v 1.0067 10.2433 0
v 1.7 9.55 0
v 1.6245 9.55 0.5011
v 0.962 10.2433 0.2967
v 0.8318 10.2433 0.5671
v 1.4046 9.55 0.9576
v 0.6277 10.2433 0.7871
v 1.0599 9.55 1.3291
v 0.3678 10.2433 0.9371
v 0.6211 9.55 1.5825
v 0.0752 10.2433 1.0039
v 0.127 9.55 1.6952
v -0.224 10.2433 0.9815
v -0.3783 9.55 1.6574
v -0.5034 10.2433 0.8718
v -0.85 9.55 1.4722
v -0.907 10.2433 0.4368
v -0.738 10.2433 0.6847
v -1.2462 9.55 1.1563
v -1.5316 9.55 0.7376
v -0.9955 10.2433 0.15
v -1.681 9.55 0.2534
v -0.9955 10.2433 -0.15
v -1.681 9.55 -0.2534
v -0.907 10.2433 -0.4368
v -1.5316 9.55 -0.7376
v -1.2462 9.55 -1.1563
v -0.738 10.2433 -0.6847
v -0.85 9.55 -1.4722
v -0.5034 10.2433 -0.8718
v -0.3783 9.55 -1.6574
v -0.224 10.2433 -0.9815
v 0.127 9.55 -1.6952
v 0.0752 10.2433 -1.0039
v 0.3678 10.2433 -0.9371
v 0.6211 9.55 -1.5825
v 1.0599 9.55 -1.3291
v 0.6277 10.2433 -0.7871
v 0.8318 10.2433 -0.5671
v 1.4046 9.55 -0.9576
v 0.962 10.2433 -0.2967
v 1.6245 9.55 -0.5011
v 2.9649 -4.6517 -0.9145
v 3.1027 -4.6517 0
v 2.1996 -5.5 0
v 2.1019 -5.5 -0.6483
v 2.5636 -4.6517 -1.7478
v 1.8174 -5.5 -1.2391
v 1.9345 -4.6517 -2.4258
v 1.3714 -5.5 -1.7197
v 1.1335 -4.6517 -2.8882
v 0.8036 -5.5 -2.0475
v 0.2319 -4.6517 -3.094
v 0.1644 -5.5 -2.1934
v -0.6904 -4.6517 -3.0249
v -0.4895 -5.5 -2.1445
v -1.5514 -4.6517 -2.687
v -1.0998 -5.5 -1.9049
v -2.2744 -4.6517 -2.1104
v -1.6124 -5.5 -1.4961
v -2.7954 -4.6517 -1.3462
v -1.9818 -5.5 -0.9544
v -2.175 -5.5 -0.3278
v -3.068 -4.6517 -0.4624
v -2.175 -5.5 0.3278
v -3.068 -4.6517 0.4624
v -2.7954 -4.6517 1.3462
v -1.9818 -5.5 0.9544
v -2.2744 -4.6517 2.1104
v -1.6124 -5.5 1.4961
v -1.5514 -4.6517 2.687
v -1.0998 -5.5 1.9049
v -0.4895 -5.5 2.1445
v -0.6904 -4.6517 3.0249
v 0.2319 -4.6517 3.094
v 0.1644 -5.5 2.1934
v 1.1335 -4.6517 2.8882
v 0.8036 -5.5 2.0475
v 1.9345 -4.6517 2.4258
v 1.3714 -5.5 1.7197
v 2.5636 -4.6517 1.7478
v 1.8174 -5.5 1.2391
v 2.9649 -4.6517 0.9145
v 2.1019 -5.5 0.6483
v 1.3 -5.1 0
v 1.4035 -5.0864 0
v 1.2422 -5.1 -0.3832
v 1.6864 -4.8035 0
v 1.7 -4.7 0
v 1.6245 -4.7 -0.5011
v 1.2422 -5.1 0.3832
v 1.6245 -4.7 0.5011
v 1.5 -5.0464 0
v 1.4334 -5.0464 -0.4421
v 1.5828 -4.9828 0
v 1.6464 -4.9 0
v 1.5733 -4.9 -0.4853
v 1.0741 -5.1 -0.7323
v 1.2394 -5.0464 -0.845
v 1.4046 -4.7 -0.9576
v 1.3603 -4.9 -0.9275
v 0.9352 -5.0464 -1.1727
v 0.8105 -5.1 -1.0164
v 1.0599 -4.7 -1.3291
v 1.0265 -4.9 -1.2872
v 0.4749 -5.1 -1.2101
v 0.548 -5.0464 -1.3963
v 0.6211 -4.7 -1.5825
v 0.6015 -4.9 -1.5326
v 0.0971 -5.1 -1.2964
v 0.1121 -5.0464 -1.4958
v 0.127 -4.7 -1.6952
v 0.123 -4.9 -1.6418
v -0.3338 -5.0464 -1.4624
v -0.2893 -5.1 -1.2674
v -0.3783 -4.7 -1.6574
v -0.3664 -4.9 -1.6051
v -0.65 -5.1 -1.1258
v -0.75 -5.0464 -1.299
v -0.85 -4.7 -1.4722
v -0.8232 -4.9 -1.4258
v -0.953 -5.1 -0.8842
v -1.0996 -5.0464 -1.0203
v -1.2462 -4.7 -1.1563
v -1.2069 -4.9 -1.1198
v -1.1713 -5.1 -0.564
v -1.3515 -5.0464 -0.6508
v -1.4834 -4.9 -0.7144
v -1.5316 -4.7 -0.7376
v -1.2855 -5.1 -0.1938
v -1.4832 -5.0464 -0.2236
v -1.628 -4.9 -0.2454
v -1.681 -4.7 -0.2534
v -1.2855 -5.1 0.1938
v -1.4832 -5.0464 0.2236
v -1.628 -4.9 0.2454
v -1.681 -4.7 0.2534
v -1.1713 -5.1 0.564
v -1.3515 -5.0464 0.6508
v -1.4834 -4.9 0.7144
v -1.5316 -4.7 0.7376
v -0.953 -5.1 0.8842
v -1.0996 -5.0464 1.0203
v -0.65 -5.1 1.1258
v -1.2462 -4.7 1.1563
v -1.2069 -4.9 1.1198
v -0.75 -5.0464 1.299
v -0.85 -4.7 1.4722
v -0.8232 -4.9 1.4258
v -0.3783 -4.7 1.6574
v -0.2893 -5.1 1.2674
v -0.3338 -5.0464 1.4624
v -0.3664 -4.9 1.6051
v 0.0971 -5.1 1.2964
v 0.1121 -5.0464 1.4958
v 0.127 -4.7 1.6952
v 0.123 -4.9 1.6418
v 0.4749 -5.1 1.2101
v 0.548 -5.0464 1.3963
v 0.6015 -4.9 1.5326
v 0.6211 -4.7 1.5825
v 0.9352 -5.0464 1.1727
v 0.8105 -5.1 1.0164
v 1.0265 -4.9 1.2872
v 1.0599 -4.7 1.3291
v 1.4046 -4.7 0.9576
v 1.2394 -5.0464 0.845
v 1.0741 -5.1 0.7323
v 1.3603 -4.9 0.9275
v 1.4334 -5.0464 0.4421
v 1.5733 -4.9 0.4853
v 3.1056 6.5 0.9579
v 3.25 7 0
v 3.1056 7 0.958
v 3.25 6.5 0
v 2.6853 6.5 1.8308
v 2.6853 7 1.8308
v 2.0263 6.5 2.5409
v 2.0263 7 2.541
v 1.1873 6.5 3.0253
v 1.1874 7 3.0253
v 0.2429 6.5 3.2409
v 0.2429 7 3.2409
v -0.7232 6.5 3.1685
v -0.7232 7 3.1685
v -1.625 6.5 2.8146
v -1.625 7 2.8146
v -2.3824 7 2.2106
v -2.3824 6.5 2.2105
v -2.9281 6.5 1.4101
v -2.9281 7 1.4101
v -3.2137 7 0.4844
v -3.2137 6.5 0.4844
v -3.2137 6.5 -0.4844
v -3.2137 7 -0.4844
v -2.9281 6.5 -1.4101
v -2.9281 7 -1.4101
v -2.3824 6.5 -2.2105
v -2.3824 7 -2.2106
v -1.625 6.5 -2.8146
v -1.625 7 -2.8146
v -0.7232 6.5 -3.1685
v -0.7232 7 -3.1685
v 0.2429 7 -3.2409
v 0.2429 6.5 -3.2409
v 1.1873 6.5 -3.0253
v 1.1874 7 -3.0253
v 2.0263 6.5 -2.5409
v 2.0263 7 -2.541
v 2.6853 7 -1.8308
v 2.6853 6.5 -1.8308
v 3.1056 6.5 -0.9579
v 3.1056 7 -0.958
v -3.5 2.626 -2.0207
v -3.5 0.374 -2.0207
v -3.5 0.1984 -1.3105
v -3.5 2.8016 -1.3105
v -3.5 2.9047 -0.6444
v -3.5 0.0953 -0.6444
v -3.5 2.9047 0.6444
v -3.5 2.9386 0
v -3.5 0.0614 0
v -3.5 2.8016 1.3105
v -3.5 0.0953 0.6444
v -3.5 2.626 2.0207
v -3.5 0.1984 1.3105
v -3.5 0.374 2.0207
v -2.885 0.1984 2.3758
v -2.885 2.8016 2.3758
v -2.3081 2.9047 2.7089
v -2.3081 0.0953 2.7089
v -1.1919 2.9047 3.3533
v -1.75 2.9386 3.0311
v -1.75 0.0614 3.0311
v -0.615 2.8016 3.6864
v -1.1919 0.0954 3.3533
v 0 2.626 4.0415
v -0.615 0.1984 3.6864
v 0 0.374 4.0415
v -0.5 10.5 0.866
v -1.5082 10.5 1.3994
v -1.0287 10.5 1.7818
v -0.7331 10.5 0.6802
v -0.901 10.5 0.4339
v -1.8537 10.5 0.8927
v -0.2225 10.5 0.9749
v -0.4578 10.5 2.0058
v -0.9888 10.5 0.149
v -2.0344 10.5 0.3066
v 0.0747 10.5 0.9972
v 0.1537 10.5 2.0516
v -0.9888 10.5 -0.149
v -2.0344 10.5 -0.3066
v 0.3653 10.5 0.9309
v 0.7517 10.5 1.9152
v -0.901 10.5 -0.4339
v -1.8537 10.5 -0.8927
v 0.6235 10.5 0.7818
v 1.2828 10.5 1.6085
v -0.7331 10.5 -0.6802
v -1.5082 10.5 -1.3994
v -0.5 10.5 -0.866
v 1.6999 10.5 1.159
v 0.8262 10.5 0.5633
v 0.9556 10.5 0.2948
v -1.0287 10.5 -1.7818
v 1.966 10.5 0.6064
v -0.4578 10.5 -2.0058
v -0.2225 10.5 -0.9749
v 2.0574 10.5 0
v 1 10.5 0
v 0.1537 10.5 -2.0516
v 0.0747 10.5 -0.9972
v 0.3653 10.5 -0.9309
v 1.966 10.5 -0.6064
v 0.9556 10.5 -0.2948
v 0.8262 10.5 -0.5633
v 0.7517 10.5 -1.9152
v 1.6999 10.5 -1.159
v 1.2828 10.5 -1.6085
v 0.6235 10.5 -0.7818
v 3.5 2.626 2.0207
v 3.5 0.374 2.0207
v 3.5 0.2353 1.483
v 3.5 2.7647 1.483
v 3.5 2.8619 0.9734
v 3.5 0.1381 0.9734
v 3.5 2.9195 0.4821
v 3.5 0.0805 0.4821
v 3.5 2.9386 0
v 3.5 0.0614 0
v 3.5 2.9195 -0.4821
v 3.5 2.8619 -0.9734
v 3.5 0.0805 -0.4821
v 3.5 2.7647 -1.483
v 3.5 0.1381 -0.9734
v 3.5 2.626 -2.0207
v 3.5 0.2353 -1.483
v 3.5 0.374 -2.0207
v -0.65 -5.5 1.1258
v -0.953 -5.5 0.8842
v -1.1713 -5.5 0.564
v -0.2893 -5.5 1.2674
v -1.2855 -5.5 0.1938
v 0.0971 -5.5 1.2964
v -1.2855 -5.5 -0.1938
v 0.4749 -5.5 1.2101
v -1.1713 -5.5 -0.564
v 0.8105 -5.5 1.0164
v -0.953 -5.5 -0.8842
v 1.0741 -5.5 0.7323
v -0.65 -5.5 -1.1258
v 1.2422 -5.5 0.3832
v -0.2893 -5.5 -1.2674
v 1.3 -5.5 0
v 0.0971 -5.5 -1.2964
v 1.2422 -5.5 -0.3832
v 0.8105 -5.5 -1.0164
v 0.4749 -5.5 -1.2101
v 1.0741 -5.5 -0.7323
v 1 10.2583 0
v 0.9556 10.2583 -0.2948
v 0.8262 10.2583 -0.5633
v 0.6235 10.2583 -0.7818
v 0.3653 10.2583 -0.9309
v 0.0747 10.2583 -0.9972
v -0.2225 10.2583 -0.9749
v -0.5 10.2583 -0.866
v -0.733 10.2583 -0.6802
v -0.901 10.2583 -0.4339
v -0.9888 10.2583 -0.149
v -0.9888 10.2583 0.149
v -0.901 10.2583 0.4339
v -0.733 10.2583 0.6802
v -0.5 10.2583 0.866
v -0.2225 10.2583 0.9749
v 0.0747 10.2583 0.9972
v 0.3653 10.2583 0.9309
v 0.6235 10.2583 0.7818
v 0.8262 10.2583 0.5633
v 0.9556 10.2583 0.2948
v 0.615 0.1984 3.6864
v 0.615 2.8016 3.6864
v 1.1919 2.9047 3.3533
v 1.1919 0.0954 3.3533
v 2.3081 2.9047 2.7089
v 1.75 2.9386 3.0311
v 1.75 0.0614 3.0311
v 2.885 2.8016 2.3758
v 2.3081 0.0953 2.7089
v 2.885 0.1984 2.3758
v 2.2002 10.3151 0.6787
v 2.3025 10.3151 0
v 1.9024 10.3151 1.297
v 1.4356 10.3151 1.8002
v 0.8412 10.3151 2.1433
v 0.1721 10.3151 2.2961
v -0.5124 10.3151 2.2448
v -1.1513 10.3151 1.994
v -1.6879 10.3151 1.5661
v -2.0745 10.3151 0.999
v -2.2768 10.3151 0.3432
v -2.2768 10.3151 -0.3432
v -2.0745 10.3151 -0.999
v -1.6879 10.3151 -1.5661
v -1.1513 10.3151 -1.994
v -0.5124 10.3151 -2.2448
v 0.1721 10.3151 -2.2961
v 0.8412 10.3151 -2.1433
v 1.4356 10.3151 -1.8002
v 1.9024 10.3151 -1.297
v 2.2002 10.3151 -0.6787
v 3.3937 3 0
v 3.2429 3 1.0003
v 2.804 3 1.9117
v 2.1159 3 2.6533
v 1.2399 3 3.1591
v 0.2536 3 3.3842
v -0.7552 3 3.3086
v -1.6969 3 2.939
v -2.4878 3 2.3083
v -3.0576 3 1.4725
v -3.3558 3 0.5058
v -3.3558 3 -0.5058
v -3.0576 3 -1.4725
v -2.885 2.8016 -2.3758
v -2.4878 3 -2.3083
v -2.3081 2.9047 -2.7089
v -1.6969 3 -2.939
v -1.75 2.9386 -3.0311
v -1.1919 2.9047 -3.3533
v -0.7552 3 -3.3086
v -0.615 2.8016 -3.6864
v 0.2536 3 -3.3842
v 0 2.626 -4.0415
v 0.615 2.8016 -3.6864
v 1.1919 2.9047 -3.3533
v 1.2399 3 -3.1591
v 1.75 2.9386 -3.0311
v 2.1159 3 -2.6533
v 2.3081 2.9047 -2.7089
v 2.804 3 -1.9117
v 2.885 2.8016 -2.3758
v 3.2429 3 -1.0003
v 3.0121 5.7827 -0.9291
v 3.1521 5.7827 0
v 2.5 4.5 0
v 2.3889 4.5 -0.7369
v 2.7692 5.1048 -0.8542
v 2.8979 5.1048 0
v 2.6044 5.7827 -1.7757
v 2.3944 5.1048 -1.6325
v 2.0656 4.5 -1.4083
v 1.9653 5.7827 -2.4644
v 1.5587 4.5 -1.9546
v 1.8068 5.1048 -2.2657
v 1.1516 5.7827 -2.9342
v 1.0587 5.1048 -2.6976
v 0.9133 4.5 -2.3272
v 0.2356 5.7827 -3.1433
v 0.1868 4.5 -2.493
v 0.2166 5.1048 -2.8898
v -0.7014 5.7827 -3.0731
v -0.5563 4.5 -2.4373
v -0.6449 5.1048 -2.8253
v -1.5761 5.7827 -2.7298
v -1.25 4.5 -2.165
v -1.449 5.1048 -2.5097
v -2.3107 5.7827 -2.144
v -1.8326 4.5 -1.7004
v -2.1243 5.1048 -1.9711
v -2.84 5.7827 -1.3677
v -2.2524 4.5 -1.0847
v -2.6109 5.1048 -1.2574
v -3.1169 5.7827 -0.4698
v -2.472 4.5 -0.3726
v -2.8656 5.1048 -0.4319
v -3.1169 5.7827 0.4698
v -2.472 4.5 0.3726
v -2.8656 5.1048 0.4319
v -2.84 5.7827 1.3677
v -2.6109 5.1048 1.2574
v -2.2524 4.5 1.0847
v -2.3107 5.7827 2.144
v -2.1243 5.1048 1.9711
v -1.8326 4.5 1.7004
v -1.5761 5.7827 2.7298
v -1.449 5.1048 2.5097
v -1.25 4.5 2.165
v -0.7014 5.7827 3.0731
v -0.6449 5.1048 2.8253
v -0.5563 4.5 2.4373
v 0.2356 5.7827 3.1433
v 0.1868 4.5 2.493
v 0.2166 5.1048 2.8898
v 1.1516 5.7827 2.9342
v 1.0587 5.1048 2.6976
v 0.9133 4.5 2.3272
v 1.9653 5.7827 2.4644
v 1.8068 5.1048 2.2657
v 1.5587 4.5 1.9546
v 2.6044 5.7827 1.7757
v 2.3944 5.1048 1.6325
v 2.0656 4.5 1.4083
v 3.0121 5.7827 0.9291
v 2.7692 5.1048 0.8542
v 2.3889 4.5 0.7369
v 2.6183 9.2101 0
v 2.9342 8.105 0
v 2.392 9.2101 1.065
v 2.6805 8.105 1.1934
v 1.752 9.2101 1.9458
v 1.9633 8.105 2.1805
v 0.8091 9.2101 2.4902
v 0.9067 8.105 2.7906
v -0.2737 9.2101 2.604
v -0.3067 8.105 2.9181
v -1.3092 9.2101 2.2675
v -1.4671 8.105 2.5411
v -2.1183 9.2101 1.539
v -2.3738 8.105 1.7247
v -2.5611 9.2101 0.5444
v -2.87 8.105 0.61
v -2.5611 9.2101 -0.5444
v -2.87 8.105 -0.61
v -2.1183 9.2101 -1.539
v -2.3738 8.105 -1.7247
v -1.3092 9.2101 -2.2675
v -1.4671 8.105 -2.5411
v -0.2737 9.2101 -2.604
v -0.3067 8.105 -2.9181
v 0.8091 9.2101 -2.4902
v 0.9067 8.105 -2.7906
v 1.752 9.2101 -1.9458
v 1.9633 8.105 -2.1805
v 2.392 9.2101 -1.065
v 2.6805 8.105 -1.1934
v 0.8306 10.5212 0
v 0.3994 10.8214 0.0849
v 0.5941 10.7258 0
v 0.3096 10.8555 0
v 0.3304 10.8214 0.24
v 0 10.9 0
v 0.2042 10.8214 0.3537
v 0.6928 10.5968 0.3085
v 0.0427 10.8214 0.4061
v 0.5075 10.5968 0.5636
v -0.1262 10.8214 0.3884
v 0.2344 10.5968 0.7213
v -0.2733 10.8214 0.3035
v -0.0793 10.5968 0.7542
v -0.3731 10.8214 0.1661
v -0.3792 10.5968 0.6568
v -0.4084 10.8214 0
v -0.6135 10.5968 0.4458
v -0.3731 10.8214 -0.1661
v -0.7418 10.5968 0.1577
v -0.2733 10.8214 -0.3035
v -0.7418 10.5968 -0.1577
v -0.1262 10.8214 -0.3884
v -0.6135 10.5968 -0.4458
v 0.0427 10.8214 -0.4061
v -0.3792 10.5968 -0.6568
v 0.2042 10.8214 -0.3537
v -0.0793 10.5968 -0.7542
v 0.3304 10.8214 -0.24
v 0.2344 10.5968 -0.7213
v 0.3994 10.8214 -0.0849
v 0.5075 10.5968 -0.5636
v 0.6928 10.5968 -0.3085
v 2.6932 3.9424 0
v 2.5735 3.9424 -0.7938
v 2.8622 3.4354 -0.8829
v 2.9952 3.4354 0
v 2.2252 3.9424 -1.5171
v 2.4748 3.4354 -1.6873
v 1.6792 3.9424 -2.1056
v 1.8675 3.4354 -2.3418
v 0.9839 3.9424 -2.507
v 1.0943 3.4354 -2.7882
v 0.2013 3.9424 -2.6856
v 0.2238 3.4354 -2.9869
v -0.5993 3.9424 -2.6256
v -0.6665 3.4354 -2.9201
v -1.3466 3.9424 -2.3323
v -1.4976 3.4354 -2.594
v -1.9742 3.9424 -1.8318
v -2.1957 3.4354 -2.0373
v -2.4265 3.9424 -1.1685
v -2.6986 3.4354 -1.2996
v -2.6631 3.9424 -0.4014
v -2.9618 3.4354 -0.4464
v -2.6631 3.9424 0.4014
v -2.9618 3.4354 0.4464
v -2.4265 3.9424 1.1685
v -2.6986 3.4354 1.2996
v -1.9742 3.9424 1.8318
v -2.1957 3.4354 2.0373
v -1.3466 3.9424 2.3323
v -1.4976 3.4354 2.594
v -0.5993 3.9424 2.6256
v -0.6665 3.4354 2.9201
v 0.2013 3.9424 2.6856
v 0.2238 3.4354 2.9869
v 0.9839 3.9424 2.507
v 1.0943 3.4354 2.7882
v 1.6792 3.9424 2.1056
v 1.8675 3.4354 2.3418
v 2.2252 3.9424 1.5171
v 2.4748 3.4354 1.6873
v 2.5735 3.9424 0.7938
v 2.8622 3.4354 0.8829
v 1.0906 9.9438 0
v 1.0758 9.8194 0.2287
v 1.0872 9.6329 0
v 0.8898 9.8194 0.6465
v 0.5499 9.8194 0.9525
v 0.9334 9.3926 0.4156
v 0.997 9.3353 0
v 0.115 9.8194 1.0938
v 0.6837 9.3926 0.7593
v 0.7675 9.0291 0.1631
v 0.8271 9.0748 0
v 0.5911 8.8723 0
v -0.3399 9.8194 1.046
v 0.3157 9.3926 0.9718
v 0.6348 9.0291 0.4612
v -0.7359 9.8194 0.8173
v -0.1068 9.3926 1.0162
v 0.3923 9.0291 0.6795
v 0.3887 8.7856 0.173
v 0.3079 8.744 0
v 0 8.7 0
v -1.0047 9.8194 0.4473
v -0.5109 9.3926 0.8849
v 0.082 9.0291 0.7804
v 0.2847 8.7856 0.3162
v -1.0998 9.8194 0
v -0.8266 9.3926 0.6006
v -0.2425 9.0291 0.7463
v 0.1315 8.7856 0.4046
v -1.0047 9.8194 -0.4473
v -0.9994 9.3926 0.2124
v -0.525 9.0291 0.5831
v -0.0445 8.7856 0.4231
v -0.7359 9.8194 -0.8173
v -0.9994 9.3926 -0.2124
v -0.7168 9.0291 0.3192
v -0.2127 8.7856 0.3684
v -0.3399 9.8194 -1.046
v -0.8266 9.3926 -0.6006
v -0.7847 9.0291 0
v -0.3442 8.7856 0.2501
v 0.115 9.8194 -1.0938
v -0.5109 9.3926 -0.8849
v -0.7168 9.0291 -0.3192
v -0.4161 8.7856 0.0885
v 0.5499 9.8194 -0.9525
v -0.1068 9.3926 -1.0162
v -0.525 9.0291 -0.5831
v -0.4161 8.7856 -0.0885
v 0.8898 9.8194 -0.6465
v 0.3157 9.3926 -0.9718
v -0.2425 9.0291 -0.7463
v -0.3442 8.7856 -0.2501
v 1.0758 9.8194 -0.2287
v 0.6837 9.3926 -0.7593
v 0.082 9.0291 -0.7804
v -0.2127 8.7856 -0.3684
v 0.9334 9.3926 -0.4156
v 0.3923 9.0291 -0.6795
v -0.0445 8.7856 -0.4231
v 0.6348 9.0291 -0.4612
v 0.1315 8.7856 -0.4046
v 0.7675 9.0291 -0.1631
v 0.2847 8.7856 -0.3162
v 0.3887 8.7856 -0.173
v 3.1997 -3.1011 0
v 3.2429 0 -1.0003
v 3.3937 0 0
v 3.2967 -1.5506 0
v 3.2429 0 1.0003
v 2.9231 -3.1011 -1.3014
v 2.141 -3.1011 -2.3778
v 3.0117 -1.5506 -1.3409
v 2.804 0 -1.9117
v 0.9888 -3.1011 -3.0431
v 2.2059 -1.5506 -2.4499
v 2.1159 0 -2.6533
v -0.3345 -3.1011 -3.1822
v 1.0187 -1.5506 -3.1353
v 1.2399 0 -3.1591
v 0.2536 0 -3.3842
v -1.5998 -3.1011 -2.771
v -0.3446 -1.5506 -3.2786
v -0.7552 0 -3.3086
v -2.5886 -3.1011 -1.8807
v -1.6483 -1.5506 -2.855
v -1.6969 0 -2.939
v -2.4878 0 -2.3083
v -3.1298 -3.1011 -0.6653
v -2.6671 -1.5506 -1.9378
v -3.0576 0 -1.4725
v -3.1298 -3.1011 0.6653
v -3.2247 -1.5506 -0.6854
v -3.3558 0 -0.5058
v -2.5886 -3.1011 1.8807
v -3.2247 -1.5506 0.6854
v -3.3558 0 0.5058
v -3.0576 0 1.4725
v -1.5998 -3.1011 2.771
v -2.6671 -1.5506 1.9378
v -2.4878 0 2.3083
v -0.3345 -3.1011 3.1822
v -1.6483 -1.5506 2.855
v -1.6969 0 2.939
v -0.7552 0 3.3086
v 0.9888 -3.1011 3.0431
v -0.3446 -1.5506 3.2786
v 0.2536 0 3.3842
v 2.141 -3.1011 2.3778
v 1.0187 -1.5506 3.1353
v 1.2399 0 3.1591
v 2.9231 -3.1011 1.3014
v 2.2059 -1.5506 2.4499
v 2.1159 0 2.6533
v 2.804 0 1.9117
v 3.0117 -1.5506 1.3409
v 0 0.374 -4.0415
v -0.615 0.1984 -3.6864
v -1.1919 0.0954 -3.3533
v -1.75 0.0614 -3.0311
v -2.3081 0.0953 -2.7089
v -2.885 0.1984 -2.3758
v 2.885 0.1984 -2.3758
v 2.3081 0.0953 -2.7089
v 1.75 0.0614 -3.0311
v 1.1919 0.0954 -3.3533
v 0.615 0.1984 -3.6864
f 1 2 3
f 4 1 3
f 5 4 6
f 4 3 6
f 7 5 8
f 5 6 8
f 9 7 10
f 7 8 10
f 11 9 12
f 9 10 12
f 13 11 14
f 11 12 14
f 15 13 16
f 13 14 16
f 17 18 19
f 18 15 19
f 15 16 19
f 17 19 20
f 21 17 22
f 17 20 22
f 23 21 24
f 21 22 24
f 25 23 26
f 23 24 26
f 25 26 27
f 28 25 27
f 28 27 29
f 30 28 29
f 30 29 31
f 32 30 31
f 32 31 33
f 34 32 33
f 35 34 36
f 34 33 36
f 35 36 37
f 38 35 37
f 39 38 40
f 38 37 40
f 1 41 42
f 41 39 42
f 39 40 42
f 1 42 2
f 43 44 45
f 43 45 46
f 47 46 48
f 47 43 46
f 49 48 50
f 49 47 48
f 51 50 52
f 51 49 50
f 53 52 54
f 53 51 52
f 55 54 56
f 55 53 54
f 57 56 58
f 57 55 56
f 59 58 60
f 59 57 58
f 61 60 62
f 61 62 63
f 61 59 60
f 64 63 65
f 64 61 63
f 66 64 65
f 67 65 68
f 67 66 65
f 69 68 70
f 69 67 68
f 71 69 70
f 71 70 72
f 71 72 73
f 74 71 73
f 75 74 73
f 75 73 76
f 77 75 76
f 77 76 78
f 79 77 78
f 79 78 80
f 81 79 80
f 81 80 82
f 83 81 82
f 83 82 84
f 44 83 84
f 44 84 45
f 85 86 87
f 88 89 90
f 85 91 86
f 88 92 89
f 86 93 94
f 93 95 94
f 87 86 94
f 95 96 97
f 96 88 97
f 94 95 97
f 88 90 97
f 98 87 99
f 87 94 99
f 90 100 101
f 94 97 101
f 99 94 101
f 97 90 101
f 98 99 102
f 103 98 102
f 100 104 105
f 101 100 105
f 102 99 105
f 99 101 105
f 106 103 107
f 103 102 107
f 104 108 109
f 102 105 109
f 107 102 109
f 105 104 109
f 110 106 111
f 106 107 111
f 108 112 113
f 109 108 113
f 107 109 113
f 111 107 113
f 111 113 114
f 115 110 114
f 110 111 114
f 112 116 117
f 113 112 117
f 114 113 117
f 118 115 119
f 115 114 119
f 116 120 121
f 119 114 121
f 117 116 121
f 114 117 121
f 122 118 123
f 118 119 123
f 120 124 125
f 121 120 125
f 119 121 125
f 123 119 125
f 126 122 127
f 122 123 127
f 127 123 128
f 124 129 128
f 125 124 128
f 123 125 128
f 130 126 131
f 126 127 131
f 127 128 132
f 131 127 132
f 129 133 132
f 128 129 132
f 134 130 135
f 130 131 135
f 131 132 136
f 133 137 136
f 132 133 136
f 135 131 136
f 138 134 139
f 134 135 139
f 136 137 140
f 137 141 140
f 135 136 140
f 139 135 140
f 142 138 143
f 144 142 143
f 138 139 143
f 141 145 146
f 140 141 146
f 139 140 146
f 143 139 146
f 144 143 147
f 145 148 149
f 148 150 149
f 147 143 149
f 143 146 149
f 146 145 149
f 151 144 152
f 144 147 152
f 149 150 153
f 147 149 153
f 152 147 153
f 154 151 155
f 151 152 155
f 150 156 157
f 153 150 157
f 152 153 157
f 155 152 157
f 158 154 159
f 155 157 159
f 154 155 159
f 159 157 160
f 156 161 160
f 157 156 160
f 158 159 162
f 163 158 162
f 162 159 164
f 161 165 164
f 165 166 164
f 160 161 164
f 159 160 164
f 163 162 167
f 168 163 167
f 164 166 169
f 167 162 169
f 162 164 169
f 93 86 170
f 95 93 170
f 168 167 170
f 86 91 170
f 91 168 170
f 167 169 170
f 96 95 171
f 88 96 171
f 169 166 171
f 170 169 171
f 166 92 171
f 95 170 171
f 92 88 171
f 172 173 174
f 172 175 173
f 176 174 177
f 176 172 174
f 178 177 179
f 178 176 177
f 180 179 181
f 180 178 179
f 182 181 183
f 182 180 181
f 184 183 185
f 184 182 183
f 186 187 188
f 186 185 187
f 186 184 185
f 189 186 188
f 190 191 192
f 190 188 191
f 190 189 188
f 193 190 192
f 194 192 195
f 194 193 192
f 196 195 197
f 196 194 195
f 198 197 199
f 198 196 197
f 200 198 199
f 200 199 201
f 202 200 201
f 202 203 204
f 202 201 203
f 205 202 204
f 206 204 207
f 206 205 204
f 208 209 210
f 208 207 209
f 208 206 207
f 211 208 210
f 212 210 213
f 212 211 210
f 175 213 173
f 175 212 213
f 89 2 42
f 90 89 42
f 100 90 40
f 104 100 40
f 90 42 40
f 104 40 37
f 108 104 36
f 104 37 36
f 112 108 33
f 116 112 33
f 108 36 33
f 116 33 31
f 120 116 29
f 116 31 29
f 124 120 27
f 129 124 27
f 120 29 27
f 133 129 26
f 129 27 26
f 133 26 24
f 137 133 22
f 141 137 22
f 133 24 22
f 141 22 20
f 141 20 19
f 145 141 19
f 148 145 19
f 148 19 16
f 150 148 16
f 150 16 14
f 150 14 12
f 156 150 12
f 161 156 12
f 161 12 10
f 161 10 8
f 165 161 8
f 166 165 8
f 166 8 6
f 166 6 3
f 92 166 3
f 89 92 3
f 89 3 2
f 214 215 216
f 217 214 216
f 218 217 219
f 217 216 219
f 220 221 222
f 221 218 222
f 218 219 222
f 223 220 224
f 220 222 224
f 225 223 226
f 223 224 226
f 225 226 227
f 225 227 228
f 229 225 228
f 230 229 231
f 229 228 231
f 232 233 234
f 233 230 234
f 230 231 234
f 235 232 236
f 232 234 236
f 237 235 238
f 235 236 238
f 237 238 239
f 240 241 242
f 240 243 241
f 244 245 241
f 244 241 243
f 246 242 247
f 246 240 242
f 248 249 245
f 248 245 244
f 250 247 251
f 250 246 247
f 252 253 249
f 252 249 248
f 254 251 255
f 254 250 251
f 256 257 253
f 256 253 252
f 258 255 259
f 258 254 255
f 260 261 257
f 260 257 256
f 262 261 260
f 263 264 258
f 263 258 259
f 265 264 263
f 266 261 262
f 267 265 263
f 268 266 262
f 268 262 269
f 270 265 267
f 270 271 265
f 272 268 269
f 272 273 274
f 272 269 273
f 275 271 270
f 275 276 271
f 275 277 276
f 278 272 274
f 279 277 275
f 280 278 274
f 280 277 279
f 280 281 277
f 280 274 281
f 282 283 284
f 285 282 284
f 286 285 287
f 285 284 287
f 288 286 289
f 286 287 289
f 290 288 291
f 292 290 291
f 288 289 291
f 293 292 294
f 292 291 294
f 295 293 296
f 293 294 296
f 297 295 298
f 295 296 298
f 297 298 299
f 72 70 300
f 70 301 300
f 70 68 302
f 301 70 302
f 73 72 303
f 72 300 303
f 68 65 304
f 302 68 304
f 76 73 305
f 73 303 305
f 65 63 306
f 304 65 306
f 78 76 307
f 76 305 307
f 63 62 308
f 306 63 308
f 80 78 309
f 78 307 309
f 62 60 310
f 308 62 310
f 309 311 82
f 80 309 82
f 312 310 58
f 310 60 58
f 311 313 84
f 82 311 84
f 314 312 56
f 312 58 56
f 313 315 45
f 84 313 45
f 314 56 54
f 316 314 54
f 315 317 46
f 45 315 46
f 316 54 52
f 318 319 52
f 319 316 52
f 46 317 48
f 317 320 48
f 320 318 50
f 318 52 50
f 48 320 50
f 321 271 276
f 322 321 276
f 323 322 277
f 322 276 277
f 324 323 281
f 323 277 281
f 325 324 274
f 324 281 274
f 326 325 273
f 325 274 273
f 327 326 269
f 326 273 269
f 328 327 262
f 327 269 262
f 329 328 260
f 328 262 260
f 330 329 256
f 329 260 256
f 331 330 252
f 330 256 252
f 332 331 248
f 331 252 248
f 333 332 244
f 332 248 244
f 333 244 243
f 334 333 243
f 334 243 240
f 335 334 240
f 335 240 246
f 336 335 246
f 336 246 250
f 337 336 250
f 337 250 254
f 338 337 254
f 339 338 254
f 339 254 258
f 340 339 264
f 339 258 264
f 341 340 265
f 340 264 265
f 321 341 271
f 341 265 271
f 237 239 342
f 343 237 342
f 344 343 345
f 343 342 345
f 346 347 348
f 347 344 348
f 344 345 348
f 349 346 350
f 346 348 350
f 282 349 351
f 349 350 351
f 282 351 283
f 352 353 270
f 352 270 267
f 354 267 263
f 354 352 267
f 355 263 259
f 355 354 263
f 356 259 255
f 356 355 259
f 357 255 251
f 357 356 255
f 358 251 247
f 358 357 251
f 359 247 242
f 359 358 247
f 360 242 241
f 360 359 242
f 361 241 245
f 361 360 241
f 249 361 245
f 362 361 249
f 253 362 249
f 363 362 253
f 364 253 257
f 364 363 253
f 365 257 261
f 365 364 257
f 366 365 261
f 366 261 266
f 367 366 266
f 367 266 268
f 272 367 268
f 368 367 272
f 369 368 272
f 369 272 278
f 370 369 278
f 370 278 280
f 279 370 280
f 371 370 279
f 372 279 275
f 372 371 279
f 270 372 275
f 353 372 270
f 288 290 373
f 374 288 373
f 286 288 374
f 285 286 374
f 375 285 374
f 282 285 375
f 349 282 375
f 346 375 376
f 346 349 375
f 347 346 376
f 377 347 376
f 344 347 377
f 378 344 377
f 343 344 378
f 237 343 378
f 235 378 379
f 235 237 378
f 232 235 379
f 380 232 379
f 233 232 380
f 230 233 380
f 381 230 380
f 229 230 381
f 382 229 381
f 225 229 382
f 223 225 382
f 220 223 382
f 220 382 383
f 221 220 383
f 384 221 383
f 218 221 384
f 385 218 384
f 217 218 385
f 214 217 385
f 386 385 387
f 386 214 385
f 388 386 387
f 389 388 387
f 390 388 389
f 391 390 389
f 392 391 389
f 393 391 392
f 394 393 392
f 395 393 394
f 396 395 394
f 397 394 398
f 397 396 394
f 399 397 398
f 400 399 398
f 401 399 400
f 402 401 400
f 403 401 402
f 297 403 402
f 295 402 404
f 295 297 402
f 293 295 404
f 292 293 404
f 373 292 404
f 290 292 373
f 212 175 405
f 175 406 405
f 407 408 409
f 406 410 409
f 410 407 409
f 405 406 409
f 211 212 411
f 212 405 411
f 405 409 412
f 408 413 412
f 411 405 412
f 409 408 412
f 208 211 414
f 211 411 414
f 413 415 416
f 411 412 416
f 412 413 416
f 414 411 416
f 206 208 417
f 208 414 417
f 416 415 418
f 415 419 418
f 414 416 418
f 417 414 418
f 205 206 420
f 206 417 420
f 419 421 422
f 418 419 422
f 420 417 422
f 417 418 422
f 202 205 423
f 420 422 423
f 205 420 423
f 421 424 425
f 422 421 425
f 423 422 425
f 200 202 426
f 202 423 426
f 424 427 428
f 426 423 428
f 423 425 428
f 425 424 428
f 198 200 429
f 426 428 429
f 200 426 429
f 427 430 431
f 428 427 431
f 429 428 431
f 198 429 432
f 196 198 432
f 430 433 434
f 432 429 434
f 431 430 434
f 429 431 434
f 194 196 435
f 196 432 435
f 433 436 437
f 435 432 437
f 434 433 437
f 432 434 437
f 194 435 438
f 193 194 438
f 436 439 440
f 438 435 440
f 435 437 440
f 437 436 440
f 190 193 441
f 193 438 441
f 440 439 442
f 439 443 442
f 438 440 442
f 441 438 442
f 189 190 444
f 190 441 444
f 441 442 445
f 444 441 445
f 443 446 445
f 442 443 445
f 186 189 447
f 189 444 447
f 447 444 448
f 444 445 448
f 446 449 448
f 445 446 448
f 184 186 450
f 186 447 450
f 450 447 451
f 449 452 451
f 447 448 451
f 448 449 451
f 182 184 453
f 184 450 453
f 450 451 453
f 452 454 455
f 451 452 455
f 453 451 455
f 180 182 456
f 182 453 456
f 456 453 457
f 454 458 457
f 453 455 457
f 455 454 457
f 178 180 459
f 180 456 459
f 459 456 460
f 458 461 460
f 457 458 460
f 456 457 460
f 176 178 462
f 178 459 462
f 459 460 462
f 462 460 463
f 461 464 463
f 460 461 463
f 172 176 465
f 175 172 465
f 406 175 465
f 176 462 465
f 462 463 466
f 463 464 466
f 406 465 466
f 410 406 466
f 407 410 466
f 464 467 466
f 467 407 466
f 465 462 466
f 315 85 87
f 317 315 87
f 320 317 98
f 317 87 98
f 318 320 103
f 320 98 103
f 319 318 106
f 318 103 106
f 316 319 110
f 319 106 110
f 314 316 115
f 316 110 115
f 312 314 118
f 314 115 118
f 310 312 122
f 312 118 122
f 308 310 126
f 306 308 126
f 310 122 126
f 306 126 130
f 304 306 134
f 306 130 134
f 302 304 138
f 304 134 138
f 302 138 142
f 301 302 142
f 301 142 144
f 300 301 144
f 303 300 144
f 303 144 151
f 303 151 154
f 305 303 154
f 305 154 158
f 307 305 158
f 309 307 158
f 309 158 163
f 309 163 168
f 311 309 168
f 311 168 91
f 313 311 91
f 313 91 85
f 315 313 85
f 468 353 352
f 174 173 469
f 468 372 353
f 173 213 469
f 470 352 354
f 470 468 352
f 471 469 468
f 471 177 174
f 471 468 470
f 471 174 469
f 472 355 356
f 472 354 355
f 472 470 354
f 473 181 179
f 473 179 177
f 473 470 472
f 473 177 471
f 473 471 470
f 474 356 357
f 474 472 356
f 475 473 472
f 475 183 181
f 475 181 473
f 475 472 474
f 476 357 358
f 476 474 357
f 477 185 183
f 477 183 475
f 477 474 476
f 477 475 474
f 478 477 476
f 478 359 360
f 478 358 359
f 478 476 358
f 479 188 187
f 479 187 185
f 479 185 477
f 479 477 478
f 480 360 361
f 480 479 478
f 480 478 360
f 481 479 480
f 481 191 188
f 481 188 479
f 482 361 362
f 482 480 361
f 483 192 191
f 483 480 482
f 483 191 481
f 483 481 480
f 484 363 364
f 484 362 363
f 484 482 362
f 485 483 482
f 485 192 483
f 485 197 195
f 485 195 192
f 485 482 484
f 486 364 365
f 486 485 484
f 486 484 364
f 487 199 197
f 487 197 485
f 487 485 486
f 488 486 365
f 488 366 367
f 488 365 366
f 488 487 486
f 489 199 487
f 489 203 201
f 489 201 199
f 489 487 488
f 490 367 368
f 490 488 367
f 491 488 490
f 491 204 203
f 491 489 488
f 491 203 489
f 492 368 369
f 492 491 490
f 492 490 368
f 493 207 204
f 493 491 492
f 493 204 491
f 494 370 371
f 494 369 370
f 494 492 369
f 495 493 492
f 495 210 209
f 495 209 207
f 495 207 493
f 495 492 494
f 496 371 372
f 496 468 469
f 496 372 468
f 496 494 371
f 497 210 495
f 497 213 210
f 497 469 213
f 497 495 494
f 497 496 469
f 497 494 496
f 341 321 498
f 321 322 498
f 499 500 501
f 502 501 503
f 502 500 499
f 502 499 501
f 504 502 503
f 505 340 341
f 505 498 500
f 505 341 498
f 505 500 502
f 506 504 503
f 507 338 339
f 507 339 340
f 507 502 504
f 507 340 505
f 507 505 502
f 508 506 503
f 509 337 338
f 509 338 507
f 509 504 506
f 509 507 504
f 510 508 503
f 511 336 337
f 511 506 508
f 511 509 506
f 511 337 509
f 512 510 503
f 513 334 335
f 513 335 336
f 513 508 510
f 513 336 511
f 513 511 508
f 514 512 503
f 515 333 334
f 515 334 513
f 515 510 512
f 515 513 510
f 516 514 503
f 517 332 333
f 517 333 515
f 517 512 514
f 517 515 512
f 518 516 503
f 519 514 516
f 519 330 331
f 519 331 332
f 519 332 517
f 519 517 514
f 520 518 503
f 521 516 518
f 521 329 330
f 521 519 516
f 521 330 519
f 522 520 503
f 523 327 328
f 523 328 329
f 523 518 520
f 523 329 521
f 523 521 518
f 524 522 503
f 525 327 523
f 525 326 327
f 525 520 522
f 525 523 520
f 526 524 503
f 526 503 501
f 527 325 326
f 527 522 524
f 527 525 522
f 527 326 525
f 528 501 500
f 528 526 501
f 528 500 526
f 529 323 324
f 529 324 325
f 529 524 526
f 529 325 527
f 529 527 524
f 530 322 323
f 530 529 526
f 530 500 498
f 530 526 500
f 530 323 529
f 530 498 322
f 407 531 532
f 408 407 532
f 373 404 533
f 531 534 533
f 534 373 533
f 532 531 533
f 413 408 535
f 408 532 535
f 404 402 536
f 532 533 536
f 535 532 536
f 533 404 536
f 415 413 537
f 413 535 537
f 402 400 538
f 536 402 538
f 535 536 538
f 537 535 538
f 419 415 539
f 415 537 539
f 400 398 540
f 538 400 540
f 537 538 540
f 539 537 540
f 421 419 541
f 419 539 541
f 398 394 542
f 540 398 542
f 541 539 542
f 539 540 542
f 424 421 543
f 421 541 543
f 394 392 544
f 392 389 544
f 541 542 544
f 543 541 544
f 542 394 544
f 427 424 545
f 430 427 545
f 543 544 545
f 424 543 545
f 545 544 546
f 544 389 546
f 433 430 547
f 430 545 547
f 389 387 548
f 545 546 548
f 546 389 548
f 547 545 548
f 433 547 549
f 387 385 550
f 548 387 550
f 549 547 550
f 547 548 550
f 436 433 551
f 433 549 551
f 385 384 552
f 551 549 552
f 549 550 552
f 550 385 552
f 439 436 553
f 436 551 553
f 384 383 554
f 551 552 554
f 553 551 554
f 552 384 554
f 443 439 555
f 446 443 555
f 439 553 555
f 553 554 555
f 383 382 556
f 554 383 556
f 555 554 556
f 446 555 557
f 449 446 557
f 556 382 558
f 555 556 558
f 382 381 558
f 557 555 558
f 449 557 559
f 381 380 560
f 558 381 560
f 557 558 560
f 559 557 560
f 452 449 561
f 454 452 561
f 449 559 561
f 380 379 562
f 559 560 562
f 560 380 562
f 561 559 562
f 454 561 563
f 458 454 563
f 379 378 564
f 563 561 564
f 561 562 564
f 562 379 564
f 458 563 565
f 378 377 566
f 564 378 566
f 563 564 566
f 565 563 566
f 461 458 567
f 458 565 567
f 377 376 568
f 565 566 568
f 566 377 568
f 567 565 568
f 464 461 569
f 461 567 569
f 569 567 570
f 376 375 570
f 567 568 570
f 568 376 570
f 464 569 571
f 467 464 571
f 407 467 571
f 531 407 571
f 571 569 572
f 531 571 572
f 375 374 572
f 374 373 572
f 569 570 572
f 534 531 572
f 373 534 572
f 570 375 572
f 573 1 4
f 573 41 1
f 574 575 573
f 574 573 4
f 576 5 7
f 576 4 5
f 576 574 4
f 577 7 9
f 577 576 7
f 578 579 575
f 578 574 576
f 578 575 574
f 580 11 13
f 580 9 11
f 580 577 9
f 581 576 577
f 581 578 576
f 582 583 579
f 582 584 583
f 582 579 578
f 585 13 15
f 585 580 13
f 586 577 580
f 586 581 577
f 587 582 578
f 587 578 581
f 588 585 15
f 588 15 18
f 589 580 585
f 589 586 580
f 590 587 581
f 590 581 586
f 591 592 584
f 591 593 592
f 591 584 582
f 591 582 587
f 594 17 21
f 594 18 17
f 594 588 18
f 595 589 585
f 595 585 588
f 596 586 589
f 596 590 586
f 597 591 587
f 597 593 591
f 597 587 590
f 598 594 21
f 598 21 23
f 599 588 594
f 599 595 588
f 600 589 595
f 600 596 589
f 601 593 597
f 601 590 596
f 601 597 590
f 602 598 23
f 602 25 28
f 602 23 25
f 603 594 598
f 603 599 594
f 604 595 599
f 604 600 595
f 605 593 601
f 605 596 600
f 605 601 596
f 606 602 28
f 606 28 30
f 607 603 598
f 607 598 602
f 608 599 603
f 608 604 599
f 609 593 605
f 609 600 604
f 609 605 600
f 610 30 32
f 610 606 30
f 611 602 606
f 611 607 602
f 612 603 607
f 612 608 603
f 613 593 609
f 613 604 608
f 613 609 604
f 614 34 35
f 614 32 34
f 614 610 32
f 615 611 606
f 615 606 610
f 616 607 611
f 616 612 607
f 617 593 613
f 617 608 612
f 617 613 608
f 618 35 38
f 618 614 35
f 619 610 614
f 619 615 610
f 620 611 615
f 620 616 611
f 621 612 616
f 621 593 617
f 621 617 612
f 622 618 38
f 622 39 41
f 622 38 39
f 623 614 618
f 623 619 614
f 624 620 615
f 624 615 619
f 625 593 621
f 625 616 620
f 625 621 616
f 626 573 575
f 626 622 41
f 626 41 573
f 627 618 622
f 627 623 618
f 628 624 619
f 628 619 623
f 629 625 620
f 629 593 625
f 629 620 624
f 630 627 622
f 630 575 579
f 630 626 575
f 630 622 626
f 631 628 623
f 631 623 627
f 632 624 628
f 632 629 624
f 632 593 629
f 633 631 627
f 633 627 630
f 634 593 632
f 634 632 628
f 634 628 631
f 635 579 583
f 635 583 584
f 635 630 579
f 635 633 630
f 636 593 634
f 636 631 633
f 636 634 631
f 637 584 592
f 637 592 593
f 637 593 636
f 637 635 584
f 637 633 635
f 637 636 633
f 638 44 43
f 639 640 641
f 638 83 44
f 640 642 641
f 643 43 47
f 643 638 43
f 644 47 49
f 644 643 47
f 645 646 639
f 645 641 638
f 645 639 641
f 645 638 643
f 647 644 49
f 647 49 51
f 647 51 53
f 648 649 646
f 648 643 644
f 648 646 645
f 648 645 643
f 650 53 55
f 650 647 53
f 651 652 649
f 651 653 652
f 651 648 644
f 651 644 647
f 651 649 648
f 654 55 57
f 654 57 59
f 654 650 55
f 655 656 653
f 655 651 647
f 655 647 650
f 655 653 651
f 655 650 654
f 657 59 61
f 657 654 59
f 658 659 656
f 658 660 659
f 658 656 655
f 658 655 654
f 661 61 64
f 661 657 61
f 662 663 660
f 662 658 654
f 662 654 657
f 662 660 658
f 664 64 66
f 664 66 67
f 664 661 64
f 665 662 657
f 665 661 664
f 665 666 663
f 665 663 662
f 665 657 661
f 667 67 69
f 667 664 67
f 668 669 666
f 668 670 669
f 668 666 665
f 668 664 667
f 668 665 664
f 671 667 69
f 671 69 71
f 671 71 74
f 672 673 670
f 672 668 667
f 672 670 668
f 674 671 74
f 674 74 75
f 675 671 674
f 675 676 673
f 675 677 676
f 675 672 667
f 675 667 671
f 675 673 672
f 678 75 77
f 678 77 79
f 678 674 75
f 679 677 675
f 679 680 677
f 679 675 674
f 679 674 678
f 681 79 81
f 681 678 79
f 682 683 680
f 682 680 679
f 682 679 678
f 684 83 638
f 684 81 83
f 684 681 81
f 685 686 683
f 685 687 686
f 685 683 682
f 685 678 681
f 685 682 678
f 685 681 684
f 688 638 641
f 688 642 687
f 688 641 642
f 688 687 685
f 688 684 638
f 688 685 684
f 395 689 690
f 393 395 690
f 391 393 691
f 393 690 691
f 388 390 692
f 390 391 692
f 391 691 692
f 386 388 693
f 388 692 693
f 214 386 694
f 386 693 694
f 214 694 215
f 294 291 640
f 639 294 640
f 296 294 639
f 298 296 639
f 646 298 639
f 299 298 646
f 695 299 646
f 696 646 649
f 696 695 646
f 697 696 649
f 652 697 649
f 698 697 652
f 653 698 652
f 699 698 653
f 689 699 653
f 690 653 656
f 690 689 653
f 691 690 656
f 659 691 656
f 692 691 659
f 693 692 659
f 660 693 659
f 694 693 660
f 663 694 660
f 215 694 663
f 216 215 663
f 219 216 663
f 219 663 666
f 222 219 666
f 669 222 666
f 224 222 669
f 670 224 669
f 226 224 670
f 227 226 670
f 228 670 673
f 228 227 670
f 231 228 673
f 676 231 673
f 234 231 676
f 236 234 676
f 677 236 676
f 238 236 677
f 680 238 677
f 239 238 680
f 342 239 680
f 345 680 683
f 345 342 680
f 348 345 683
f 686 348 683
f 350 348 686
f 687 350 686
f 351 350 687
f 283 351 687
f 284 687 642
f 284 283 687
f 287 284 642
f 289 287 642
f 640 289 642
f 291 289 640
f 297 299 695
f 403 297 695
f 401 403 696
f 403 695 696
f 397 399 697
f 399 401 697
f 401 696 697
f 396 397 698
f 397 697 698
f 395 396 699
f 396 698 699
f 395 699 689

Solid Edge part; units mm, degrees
sketch "Sketch1" plane through (0, 0, 0) normal (0, 0, 1) x (1, 0, 0)
  arc A0 (0, 10.9) -> (1, 10.2583) centre (0, 9.8) cw
  line L0 (1, 10.2583) -> (1, 10.5)
  line L1 (1, 10.5) -> (2.0574, 10.5)
  line L2 (2.0574, 10.5) -> (2.3025, 10.3151)
  line L3 (2.3025, 10.3151) -> (3.25, 7)
  line L4 (3.25, 7) -> (3.25, 6.5)
  arc A1 (3.25, 6.5) -> (2.5, 4.5) centre (0.0009, 6.5778) cw
  arc A2 (2.5, 4.5) -> (3.3937, 3) centre (5.3226, 5.1655) ccw
  line L5 (3.3937, 3) -> (5.5, 1.7839)
  line L6 (5.5, 1.7839) -> (5.5, 1.2161)
  line L7 (5.5, 1.2161) -> (3.3937, 0)
  line L8 (3.3937, 0) -> (3.1027, -4.6517)
  line L9 (3.1027, -4.6517) -> (2.1996, -5.5)
  line L10 (2.1996, -5.5) -> (1.3, -5.5)
  line L11 (1.3, -5.5) -> (1.3, -5.1)
  arc A3 (1.3, -5.1) -> (1.7, -4.7) centre (1.3, -4.7) ccw
  line L12 (1.7, -4.7) -> (1.7, 9.55)
  line L13 (1.7, 9.55) -> (1.0067, 10.2433)
  arc A4 (1.0067, 10.2433) -> (0, 8.7) centre (0, 9.8) cw
  line L14 (0, 8.7) -> (0, 10.9)
revolve "RevolvedProtrusion1" add sketch "Sketch1" angle 360 about axis through (0, -5.5, 0) along (0, 1, 0)
sketch "Sketch2" plane through (0, 0, 0) normal (0, -1, 0) x (1, 0, 0)
  line L0 (-6, -6) -> (-6, 6)
  line L1 (-6, 6) -> (6, 6)
  line L2 (6, 6) -> (6, -6)
  line L3 (6, -6) -> (-6, -6)
  line L4 (-3.5, 2.0207) -> (0, 4.0415)
  line L5 (0, 4.0415) -> (3.5, 2.0207)
  line L6 (3.5, 2.0207) -> (3.5, -2.0207)
  line L7 (3.5, -2.0207) -> (0, -4.0415)
  line L8 (0, -4.0415) -> (-3.5, -2.0207)
  line L9 (-3.5, -2.0207) -> (-3.5, 2.0207)
extrude "Cutout1" cut sketch "Sketch2" against normal blind 3
properties part number "1/4-28 SAE-LT"
